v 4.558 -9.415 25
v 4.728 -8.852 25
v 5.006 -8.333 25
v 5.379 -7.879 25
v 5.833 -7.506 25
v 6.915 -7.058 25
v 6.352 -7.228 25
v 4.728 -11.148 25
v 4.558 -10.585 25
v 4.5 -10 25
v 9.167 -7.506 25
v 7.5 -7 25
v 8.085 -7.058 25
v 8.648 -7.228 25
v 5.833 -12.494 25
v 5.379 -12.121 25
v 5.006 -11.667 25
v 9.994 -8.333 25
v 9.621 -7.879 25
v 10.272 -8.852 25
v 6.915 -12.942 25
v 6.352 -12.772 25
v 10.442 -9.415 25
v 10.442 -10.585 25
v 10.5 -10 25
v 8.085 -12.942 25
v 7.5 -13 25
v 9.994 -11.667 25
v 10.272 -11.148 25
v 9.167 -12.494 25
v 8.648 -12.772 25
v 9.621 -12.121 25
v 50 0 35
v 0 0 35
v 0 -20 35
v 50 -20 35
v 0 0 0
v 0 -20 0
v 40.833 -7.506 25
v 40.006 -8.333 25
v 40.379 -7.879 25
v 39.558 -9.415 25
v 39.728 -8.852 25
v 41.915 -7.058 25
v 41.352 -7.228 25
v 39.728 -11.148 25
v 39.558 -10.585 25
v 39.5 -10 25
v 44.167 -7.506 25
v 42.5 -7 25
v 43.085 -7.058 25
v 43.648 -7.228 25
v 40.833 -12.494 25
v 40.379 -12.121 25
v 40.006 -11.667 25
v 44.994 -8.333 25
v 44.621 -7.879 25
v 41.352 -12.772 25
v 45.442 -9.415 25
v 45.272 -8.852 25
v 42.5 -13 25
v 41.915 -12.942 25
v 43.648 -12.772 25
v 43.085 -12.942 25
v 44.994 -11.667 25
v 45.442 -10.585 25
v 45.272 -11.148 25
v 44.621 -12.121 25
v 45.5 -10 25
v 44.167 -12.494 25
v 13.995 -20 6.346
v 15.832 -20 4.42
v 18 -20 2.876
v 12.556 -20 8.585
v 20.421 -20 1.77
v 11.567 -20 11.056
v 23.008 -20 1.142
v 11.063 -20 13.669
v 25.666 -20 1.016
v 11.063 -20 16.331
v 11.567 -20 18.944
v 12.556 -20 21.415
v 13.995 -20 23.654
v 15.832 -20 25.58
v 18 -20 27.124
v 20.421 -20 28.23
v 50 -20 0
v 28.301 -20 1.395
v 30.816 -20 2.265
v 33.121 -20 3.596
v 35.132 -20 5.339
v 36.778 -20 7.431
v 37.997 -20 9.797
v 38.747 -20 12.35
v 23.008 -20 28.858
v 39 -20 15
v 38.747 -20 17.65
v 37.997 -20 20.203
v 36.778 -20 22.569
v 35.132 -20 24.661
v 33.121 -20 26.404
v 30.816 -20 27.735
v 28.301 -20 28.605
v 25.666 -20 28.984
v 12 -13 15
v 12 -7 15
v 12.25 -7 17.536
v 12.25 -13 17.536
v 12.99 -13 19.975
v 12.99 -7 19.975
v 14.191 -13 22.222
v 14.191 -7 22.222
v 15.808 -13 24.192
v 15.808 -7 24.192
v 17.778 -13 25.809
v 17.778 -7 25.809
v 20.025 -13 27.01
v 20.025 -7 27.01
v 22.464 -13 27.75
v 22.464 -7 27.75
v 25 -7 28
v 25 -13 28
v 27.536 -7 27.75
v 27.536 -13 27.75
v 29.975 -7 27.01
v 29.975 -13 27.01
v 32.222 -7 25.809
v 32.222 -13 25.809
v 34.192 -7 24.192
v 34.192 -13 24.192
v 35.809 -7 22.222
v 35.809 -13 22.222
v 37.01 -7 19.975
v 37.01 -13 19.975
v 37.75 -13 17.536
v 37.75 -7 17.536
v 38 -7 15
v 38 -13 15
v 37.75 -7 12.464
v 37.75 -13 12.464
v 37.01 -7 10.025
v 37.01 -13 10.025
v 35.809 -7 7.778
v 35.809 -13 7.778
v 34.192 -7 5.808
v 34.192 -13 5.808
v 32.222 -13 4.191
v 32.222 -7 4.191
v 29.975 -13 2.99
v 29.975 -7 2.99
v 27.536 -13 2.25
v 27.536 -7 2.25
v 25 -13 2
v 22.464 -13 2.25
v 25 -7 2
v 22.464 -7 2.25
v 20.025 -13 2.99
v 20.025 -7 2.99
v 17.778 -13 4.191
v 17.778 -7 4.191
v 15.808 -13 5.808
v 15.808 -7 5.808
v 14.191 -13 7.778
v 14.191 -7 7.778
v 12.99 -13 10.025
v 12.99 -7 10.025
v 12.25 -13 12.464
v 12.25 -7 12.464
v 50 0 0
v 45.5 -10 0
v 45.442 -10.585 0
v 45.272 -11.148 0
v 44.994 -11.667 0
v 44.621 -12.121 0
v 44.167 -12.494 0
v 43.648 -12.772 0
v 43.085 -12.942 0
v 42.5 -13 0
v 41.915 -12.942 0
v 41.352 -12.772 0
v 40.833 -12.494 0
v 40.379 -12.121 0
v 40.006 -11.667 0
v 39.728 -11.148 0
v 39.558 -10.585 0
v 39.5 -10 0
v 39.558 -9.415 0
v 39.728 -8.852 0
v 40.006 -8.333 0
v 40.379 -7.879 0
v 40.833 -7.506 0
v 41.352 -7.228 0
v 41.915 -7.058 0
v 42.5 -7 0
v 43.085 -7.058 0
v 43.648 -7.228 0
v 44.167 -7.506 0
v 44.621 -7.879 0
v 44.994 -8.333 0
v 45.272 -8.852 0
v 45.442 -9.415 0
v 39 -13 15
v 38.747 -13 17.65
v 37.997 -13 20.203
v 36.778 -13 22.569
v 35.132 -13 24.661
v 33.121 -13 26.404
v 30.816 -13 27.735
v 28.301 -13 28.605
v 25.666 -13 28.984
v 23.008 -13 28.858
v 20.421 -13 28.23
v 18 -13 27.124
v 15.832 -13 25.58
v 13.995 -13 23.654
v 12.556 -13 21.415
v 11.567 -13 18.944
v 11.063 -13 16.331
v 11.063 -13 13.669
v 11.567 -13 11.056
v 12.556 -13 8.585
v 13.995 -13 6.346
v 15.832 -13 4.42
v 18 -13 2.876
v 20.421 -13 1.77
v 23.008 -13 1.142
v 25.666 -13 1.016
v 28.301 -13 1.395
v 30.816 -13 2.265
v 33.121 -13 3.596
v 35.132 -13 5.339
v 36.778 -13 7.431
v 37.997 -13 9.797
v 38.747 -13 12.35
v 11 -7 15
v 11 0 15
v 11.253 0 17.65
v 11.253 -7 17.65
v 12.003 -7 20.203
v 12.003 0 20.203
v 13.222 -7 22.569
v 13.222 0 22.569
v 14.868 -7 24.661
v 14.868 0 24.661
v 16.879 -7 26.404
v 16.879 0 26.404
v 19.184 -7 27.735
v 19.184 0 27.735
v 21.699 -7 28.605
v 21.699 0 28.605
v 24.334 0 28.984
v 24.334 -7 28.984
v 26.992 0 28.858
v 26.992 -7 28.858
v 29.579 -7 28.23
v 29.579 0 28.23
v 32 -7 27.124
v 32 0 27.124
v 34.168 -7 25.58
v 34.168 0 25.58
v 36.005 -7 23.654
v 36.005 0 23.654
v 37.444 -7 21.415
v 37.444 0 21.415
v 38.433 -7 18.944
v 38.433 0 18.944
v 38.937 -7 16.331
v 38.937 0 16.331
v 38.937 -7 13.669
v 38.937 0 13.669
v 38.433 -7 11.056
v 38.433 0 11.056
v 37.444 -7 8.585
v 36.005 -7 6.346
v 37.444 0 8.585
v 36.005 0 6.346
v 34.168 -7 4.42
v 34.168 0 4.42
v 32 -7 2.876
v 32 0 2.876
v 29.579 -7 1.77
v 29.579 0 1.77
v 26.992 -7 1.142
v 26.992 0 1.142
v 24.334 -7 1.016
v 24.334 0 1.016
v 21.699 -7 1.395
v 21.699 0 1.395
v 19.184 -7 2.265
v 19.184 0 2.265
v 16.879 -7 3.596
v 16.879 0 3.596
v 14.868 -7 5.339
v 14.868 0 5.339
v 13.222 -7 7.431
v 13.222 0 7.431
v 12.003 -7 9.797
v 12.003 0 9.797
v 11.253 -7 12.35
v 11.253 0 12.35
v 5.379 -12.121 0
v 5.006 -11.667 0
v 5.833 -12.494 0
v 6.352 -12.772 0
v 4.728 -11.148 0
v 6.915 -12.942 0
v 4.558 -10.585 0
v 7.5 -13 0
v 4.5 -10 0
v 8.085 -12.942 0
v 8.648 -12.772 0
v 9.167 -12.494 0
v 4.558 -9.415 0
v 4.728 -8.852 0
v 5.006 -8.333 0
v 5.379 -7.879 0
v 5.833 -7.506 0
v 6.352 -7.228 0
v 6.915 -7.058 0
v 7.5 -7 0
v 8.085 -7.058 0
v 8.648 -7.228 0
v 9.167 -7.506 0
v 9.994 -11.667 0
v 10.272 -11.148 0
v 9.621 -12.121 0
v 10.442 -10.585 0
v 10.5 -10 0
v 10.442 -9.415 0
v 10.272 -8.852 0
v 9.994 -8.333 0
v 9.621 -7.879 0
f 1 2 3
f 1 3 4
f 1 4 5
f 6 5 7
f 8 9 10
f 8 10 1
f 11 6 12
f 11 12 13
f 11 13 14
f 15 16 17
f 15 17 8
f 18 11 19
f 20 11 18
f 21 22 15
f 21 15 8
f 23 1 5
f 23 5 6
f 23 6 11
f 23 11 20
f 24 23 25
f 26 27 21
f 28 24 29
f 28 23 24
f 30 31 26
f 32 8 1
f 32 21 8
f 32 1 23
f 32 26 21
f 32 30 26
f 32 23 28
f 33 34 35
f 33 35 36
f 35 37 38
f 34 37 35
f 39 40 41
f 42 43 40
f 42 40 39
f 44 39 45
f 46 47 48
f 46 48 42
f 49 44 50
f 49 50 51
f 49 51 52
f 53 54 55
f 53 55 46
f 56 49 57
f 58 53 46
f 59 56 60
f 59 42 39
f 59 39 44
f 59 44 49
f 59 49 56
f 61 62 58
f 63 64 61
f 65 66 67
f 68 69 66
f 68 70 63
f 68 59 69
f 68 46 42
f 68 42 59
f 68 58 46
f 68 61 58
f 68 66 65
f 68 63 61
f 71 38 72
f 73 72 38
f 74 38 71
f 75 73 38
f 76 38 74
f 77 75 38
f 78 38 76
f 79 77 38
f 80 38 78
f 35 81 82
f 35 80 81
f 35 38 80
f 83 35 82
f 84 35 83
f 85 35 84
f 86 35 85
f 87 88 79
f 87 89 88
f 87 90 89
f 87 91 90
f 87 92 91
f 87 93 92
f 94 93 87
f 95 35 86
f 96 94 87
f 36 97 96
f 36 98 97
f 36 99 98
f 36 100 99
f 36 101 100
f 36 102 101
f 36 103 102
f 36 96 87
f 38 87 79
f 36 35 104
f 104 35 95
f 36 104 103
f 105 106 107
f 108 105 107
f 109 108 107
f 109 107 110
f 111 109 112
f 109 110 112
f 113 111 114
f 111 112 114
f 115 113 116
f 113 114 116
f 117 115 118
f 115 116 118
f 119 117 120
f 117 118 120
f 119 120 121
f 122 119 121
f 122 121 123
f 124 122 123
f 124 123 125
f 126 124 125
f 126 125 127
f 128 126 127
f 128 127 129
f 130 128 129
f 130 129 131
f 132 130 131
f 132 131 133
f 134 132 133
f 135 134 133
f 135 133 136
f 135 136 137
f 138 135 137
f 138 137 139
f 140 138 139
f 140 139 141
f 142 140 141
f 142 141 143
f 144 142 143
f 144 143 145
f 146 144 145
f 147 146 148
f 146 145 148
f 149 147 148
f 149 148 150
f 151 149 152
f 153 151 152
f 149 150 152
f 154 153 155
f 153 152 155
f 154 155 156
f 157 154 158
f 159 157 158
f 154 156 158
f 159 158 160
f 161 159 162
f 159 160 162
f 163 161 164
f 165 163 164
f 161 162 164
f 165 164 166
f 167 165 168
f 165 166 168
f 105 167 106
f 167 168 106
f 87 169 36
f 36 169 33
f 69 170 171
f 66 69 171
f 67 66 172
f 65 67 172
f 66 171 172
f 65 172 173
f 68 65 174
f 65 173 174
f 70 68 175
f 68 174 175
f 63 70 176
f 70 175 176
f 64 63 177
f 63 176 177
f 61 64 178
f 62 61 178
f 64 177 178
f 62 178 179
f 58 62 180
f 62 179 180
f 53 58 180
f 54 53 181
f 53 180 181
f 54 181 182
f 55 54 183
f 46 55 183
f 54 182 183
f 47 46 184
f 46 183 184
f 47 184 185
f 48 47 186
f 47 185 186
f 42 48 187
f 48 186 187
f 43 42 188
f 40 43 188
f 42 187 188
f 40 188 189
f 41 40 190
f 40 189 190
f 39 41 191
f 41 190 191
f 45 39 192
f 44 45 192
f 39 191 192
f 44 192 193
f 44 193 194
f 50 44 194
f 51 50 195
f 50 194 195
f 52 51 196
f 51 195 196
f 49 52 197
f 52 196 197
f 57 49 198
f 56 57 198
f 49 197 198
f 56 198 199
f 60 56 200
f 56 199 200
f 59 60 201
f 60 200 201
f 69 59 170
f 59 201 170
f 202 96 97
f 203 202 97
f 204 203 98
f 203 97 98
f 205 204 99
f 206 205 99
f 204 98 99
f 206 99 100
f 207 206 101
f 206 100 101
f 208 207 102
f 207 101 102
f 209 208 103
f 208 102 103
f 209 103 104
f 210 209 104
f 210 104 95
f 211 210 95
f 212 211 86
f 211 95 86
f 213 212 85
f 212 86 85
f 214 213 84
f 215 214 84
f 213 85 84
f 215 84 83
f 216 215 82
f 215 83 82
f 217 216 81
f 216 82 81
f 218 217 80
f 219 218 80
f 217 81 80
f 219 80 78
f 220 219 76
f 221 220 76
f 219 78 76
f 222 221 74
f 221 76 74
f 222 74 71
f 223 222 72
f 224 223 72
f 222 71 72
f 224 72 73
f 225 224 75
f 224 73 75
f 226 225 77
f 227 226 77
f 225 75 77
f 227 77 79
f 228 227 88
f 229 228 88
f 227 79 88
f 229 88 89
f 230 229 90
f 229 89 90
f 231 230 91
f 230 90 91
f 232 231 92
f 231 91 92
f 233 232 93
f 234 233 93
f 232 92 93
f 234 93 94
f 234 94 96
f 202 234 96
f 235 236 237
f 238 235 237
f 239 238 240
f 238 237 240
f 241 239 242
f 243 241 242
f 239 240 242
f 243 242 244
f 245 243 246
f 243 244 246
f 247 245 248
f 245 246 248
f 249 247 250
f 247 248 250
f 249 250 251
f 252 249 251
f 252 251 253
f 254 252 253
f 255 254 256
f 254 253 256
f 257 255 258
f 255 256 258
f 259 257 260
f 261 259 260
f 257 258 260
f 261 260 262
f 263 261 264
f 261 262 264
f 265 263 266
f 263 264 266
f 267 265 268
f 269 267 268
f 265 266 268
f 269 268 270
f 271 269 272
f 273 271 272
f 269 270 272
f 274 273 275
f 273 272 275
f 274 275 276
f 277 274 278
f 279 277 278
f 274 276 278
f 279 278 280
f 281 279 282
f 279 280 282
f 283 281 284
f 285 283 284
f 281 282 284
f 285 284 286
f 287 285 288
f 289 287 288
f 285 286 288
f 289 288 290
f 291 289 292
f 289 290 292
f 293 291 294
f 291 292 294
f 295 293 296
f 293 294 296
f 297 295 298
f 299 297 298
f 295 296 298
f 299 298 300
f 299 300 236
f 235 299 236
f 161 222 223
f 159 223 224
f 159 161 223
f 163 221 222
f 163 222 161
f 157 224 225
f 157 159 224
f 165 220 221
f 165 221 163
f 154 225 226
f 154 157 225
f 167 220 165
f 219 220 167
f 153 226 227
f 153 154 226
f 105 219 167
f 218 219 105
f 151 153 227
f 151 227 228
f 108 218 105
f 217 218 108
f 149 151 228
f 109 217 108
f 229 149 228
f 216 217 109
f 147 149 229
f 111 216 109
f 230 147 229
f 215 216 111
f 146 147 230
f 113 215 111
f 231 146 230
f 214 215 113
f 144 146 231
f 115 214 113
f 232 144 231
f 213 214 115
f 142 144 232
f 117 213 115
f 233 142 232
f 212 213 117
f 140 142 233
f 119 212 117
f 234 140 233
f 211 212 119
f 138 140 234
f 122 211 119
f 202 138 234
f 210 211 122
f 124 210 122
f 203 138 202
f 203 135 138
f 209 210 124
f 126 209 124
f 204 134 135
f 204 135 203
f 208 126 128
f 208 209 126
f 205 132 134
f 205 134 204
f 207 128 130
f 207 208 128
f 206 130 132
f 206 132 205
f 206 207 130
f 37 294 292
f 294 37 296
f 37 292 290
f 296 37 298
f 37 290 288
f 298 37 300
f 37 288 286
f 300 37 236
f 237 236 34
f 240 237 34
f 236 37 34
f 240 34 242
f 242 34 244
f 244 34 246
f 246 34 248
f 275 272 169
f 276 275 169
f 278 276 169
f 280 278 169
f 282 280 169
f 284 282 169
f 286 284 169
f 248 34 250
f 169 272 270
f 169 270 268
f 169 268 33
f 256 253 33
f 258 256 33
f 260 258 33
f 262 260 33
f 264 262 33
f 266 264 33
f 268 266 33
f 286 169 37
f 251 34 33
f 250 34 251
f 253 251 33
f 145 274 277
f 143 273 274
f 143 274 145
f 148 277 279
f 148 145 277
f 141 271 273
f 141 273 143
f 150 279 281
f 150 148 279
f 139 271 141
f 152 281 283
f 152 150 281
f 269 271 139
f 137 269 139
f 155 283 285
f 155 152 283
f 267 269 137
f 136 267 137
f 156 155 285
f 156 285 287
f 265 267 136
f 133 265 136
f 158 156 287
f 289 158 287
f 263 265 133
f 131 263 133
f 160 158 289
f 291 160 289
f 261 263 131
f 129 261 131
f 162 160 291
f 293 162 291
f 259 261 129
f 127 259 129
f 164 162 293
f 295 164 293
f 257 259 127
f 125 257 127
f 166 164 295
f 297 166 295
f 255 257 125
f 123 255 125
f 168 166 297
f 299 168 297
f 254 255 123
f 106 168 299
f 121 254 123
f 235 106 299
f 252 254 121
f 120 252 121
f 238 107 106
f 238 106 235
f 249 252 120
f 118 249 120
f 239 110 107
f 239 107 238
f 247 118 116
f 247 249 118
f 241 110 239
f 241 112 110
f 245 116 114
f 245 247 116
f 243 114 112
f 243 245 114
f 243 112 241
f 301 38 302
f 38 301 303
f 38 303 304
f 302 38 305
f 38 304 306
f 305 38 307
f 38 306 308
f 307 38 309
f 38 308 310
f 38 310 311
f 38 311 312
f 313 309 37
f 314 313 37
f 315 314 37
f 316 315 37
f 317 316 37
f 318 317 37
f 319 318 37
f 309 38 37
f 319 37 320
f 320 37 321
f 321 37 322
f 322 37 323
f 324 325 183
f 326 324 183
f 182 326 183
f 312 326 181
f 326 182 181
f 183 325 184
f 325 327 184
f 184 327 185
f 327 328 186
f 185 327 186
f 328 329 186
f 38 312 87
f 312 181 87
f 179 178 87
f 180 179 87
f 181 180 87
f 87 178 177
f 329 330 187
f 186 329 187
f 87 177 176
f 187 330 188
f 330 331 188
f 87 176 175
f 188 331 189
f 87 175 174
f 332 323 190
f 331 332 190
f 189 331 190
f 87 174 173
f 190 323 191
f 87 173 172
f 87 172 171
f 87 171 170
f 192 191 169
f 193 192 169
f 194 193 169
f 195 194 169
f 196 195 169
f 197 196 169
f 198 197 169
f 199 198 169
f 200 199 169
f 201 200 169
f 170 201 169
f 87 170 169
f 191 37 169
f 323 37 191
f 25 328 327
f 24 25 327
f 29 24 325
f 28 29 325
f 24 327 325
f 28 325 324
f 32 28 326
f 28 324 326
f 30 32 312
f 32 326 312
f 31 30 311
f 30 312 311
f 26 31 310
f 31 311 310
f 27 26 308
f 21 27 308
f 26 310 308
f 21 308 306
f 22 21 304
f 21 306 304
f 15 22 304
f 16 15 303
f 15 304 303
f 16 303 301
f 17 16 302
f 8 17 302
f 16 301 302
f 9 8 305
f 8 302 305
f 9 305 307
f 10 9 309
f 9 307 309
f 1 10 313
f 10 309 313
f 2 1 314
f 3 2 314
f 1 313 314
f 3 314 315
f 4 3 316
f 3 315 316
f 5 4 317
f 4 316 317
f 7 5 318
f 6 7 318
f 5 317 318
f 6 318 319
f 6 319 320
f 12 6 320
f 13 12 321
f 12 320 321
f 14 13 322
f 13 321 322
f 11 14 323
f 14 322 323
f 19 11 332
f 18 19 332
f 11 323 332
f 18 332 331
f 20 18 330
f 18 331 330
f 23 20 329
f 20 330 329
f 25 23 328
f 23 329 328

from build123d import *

# Parameters (mm, degrees)
F0_W     = 50
F0_H     = 35
F1_DEPTH = 20
F2_R     = 14
F3_DEPTH = 7
F4_R     = 14
F5_DEPTH = 7
F6_R     = 13
F7_DEPTH = 13.001
F8_R     = 3
F9_DEPTH = 25


with BuildPart() as f1:
    # F0 (on Front) → F1 (new body)
    with BuildSketch(Plane.XZ):
        with Locations((25, 17.5)):
            Rectangle(F0_W, F0_H)
    extrude(amount=F1_DEPTH)

    # F2 (on face) → F3 (cut)
    with BuildSketch(Plane.XZ.offset(20)):
        with Locations((25, 15)):
            Circle(F2_R)
    extrude(amount=-F3_DEPTH, mode=Mode.SUBTRACT)

    # F4 (on face) → F5 (cut)
    with BuildSketch(Plane(origin=(0, 0, 0), x_dir=(-1, 0, 0), z_dir=(0, 1, 0))):
        with Locations((-25, 15)):
            Circle(F4_R)
    extrude(amount=-F5_DEPTH, mode=Mode.SUBTRACT)

    # F6 (on face) → F7 (cut, through all)
    with BuildSketch(Plane(origin=(0, -7, 0), x_dir=(-1, 0, 0), z_dir=(0, 1, 0))):
        with Locations((-25, 15)):
            Circle(F6_R)
    extrude(amount=-F7_DEPTH, mode=Mode.SUBTRACT)

    # F8 (on face) → F9 (cut)
    with BuildSketch(Plane(origin=(0, 0, 0), x_dir=(1, 0, 0), z_dir=(0, 0, -1))):
        with Locations((7.5, 10)):
            Circle(F8_R)
        with Locations((42.5, 10)):
            Circle(F8_R)
    extrude(amount=-F9_DEPTH, mode=Mode.SUBTRACT)


solid = f1.part
